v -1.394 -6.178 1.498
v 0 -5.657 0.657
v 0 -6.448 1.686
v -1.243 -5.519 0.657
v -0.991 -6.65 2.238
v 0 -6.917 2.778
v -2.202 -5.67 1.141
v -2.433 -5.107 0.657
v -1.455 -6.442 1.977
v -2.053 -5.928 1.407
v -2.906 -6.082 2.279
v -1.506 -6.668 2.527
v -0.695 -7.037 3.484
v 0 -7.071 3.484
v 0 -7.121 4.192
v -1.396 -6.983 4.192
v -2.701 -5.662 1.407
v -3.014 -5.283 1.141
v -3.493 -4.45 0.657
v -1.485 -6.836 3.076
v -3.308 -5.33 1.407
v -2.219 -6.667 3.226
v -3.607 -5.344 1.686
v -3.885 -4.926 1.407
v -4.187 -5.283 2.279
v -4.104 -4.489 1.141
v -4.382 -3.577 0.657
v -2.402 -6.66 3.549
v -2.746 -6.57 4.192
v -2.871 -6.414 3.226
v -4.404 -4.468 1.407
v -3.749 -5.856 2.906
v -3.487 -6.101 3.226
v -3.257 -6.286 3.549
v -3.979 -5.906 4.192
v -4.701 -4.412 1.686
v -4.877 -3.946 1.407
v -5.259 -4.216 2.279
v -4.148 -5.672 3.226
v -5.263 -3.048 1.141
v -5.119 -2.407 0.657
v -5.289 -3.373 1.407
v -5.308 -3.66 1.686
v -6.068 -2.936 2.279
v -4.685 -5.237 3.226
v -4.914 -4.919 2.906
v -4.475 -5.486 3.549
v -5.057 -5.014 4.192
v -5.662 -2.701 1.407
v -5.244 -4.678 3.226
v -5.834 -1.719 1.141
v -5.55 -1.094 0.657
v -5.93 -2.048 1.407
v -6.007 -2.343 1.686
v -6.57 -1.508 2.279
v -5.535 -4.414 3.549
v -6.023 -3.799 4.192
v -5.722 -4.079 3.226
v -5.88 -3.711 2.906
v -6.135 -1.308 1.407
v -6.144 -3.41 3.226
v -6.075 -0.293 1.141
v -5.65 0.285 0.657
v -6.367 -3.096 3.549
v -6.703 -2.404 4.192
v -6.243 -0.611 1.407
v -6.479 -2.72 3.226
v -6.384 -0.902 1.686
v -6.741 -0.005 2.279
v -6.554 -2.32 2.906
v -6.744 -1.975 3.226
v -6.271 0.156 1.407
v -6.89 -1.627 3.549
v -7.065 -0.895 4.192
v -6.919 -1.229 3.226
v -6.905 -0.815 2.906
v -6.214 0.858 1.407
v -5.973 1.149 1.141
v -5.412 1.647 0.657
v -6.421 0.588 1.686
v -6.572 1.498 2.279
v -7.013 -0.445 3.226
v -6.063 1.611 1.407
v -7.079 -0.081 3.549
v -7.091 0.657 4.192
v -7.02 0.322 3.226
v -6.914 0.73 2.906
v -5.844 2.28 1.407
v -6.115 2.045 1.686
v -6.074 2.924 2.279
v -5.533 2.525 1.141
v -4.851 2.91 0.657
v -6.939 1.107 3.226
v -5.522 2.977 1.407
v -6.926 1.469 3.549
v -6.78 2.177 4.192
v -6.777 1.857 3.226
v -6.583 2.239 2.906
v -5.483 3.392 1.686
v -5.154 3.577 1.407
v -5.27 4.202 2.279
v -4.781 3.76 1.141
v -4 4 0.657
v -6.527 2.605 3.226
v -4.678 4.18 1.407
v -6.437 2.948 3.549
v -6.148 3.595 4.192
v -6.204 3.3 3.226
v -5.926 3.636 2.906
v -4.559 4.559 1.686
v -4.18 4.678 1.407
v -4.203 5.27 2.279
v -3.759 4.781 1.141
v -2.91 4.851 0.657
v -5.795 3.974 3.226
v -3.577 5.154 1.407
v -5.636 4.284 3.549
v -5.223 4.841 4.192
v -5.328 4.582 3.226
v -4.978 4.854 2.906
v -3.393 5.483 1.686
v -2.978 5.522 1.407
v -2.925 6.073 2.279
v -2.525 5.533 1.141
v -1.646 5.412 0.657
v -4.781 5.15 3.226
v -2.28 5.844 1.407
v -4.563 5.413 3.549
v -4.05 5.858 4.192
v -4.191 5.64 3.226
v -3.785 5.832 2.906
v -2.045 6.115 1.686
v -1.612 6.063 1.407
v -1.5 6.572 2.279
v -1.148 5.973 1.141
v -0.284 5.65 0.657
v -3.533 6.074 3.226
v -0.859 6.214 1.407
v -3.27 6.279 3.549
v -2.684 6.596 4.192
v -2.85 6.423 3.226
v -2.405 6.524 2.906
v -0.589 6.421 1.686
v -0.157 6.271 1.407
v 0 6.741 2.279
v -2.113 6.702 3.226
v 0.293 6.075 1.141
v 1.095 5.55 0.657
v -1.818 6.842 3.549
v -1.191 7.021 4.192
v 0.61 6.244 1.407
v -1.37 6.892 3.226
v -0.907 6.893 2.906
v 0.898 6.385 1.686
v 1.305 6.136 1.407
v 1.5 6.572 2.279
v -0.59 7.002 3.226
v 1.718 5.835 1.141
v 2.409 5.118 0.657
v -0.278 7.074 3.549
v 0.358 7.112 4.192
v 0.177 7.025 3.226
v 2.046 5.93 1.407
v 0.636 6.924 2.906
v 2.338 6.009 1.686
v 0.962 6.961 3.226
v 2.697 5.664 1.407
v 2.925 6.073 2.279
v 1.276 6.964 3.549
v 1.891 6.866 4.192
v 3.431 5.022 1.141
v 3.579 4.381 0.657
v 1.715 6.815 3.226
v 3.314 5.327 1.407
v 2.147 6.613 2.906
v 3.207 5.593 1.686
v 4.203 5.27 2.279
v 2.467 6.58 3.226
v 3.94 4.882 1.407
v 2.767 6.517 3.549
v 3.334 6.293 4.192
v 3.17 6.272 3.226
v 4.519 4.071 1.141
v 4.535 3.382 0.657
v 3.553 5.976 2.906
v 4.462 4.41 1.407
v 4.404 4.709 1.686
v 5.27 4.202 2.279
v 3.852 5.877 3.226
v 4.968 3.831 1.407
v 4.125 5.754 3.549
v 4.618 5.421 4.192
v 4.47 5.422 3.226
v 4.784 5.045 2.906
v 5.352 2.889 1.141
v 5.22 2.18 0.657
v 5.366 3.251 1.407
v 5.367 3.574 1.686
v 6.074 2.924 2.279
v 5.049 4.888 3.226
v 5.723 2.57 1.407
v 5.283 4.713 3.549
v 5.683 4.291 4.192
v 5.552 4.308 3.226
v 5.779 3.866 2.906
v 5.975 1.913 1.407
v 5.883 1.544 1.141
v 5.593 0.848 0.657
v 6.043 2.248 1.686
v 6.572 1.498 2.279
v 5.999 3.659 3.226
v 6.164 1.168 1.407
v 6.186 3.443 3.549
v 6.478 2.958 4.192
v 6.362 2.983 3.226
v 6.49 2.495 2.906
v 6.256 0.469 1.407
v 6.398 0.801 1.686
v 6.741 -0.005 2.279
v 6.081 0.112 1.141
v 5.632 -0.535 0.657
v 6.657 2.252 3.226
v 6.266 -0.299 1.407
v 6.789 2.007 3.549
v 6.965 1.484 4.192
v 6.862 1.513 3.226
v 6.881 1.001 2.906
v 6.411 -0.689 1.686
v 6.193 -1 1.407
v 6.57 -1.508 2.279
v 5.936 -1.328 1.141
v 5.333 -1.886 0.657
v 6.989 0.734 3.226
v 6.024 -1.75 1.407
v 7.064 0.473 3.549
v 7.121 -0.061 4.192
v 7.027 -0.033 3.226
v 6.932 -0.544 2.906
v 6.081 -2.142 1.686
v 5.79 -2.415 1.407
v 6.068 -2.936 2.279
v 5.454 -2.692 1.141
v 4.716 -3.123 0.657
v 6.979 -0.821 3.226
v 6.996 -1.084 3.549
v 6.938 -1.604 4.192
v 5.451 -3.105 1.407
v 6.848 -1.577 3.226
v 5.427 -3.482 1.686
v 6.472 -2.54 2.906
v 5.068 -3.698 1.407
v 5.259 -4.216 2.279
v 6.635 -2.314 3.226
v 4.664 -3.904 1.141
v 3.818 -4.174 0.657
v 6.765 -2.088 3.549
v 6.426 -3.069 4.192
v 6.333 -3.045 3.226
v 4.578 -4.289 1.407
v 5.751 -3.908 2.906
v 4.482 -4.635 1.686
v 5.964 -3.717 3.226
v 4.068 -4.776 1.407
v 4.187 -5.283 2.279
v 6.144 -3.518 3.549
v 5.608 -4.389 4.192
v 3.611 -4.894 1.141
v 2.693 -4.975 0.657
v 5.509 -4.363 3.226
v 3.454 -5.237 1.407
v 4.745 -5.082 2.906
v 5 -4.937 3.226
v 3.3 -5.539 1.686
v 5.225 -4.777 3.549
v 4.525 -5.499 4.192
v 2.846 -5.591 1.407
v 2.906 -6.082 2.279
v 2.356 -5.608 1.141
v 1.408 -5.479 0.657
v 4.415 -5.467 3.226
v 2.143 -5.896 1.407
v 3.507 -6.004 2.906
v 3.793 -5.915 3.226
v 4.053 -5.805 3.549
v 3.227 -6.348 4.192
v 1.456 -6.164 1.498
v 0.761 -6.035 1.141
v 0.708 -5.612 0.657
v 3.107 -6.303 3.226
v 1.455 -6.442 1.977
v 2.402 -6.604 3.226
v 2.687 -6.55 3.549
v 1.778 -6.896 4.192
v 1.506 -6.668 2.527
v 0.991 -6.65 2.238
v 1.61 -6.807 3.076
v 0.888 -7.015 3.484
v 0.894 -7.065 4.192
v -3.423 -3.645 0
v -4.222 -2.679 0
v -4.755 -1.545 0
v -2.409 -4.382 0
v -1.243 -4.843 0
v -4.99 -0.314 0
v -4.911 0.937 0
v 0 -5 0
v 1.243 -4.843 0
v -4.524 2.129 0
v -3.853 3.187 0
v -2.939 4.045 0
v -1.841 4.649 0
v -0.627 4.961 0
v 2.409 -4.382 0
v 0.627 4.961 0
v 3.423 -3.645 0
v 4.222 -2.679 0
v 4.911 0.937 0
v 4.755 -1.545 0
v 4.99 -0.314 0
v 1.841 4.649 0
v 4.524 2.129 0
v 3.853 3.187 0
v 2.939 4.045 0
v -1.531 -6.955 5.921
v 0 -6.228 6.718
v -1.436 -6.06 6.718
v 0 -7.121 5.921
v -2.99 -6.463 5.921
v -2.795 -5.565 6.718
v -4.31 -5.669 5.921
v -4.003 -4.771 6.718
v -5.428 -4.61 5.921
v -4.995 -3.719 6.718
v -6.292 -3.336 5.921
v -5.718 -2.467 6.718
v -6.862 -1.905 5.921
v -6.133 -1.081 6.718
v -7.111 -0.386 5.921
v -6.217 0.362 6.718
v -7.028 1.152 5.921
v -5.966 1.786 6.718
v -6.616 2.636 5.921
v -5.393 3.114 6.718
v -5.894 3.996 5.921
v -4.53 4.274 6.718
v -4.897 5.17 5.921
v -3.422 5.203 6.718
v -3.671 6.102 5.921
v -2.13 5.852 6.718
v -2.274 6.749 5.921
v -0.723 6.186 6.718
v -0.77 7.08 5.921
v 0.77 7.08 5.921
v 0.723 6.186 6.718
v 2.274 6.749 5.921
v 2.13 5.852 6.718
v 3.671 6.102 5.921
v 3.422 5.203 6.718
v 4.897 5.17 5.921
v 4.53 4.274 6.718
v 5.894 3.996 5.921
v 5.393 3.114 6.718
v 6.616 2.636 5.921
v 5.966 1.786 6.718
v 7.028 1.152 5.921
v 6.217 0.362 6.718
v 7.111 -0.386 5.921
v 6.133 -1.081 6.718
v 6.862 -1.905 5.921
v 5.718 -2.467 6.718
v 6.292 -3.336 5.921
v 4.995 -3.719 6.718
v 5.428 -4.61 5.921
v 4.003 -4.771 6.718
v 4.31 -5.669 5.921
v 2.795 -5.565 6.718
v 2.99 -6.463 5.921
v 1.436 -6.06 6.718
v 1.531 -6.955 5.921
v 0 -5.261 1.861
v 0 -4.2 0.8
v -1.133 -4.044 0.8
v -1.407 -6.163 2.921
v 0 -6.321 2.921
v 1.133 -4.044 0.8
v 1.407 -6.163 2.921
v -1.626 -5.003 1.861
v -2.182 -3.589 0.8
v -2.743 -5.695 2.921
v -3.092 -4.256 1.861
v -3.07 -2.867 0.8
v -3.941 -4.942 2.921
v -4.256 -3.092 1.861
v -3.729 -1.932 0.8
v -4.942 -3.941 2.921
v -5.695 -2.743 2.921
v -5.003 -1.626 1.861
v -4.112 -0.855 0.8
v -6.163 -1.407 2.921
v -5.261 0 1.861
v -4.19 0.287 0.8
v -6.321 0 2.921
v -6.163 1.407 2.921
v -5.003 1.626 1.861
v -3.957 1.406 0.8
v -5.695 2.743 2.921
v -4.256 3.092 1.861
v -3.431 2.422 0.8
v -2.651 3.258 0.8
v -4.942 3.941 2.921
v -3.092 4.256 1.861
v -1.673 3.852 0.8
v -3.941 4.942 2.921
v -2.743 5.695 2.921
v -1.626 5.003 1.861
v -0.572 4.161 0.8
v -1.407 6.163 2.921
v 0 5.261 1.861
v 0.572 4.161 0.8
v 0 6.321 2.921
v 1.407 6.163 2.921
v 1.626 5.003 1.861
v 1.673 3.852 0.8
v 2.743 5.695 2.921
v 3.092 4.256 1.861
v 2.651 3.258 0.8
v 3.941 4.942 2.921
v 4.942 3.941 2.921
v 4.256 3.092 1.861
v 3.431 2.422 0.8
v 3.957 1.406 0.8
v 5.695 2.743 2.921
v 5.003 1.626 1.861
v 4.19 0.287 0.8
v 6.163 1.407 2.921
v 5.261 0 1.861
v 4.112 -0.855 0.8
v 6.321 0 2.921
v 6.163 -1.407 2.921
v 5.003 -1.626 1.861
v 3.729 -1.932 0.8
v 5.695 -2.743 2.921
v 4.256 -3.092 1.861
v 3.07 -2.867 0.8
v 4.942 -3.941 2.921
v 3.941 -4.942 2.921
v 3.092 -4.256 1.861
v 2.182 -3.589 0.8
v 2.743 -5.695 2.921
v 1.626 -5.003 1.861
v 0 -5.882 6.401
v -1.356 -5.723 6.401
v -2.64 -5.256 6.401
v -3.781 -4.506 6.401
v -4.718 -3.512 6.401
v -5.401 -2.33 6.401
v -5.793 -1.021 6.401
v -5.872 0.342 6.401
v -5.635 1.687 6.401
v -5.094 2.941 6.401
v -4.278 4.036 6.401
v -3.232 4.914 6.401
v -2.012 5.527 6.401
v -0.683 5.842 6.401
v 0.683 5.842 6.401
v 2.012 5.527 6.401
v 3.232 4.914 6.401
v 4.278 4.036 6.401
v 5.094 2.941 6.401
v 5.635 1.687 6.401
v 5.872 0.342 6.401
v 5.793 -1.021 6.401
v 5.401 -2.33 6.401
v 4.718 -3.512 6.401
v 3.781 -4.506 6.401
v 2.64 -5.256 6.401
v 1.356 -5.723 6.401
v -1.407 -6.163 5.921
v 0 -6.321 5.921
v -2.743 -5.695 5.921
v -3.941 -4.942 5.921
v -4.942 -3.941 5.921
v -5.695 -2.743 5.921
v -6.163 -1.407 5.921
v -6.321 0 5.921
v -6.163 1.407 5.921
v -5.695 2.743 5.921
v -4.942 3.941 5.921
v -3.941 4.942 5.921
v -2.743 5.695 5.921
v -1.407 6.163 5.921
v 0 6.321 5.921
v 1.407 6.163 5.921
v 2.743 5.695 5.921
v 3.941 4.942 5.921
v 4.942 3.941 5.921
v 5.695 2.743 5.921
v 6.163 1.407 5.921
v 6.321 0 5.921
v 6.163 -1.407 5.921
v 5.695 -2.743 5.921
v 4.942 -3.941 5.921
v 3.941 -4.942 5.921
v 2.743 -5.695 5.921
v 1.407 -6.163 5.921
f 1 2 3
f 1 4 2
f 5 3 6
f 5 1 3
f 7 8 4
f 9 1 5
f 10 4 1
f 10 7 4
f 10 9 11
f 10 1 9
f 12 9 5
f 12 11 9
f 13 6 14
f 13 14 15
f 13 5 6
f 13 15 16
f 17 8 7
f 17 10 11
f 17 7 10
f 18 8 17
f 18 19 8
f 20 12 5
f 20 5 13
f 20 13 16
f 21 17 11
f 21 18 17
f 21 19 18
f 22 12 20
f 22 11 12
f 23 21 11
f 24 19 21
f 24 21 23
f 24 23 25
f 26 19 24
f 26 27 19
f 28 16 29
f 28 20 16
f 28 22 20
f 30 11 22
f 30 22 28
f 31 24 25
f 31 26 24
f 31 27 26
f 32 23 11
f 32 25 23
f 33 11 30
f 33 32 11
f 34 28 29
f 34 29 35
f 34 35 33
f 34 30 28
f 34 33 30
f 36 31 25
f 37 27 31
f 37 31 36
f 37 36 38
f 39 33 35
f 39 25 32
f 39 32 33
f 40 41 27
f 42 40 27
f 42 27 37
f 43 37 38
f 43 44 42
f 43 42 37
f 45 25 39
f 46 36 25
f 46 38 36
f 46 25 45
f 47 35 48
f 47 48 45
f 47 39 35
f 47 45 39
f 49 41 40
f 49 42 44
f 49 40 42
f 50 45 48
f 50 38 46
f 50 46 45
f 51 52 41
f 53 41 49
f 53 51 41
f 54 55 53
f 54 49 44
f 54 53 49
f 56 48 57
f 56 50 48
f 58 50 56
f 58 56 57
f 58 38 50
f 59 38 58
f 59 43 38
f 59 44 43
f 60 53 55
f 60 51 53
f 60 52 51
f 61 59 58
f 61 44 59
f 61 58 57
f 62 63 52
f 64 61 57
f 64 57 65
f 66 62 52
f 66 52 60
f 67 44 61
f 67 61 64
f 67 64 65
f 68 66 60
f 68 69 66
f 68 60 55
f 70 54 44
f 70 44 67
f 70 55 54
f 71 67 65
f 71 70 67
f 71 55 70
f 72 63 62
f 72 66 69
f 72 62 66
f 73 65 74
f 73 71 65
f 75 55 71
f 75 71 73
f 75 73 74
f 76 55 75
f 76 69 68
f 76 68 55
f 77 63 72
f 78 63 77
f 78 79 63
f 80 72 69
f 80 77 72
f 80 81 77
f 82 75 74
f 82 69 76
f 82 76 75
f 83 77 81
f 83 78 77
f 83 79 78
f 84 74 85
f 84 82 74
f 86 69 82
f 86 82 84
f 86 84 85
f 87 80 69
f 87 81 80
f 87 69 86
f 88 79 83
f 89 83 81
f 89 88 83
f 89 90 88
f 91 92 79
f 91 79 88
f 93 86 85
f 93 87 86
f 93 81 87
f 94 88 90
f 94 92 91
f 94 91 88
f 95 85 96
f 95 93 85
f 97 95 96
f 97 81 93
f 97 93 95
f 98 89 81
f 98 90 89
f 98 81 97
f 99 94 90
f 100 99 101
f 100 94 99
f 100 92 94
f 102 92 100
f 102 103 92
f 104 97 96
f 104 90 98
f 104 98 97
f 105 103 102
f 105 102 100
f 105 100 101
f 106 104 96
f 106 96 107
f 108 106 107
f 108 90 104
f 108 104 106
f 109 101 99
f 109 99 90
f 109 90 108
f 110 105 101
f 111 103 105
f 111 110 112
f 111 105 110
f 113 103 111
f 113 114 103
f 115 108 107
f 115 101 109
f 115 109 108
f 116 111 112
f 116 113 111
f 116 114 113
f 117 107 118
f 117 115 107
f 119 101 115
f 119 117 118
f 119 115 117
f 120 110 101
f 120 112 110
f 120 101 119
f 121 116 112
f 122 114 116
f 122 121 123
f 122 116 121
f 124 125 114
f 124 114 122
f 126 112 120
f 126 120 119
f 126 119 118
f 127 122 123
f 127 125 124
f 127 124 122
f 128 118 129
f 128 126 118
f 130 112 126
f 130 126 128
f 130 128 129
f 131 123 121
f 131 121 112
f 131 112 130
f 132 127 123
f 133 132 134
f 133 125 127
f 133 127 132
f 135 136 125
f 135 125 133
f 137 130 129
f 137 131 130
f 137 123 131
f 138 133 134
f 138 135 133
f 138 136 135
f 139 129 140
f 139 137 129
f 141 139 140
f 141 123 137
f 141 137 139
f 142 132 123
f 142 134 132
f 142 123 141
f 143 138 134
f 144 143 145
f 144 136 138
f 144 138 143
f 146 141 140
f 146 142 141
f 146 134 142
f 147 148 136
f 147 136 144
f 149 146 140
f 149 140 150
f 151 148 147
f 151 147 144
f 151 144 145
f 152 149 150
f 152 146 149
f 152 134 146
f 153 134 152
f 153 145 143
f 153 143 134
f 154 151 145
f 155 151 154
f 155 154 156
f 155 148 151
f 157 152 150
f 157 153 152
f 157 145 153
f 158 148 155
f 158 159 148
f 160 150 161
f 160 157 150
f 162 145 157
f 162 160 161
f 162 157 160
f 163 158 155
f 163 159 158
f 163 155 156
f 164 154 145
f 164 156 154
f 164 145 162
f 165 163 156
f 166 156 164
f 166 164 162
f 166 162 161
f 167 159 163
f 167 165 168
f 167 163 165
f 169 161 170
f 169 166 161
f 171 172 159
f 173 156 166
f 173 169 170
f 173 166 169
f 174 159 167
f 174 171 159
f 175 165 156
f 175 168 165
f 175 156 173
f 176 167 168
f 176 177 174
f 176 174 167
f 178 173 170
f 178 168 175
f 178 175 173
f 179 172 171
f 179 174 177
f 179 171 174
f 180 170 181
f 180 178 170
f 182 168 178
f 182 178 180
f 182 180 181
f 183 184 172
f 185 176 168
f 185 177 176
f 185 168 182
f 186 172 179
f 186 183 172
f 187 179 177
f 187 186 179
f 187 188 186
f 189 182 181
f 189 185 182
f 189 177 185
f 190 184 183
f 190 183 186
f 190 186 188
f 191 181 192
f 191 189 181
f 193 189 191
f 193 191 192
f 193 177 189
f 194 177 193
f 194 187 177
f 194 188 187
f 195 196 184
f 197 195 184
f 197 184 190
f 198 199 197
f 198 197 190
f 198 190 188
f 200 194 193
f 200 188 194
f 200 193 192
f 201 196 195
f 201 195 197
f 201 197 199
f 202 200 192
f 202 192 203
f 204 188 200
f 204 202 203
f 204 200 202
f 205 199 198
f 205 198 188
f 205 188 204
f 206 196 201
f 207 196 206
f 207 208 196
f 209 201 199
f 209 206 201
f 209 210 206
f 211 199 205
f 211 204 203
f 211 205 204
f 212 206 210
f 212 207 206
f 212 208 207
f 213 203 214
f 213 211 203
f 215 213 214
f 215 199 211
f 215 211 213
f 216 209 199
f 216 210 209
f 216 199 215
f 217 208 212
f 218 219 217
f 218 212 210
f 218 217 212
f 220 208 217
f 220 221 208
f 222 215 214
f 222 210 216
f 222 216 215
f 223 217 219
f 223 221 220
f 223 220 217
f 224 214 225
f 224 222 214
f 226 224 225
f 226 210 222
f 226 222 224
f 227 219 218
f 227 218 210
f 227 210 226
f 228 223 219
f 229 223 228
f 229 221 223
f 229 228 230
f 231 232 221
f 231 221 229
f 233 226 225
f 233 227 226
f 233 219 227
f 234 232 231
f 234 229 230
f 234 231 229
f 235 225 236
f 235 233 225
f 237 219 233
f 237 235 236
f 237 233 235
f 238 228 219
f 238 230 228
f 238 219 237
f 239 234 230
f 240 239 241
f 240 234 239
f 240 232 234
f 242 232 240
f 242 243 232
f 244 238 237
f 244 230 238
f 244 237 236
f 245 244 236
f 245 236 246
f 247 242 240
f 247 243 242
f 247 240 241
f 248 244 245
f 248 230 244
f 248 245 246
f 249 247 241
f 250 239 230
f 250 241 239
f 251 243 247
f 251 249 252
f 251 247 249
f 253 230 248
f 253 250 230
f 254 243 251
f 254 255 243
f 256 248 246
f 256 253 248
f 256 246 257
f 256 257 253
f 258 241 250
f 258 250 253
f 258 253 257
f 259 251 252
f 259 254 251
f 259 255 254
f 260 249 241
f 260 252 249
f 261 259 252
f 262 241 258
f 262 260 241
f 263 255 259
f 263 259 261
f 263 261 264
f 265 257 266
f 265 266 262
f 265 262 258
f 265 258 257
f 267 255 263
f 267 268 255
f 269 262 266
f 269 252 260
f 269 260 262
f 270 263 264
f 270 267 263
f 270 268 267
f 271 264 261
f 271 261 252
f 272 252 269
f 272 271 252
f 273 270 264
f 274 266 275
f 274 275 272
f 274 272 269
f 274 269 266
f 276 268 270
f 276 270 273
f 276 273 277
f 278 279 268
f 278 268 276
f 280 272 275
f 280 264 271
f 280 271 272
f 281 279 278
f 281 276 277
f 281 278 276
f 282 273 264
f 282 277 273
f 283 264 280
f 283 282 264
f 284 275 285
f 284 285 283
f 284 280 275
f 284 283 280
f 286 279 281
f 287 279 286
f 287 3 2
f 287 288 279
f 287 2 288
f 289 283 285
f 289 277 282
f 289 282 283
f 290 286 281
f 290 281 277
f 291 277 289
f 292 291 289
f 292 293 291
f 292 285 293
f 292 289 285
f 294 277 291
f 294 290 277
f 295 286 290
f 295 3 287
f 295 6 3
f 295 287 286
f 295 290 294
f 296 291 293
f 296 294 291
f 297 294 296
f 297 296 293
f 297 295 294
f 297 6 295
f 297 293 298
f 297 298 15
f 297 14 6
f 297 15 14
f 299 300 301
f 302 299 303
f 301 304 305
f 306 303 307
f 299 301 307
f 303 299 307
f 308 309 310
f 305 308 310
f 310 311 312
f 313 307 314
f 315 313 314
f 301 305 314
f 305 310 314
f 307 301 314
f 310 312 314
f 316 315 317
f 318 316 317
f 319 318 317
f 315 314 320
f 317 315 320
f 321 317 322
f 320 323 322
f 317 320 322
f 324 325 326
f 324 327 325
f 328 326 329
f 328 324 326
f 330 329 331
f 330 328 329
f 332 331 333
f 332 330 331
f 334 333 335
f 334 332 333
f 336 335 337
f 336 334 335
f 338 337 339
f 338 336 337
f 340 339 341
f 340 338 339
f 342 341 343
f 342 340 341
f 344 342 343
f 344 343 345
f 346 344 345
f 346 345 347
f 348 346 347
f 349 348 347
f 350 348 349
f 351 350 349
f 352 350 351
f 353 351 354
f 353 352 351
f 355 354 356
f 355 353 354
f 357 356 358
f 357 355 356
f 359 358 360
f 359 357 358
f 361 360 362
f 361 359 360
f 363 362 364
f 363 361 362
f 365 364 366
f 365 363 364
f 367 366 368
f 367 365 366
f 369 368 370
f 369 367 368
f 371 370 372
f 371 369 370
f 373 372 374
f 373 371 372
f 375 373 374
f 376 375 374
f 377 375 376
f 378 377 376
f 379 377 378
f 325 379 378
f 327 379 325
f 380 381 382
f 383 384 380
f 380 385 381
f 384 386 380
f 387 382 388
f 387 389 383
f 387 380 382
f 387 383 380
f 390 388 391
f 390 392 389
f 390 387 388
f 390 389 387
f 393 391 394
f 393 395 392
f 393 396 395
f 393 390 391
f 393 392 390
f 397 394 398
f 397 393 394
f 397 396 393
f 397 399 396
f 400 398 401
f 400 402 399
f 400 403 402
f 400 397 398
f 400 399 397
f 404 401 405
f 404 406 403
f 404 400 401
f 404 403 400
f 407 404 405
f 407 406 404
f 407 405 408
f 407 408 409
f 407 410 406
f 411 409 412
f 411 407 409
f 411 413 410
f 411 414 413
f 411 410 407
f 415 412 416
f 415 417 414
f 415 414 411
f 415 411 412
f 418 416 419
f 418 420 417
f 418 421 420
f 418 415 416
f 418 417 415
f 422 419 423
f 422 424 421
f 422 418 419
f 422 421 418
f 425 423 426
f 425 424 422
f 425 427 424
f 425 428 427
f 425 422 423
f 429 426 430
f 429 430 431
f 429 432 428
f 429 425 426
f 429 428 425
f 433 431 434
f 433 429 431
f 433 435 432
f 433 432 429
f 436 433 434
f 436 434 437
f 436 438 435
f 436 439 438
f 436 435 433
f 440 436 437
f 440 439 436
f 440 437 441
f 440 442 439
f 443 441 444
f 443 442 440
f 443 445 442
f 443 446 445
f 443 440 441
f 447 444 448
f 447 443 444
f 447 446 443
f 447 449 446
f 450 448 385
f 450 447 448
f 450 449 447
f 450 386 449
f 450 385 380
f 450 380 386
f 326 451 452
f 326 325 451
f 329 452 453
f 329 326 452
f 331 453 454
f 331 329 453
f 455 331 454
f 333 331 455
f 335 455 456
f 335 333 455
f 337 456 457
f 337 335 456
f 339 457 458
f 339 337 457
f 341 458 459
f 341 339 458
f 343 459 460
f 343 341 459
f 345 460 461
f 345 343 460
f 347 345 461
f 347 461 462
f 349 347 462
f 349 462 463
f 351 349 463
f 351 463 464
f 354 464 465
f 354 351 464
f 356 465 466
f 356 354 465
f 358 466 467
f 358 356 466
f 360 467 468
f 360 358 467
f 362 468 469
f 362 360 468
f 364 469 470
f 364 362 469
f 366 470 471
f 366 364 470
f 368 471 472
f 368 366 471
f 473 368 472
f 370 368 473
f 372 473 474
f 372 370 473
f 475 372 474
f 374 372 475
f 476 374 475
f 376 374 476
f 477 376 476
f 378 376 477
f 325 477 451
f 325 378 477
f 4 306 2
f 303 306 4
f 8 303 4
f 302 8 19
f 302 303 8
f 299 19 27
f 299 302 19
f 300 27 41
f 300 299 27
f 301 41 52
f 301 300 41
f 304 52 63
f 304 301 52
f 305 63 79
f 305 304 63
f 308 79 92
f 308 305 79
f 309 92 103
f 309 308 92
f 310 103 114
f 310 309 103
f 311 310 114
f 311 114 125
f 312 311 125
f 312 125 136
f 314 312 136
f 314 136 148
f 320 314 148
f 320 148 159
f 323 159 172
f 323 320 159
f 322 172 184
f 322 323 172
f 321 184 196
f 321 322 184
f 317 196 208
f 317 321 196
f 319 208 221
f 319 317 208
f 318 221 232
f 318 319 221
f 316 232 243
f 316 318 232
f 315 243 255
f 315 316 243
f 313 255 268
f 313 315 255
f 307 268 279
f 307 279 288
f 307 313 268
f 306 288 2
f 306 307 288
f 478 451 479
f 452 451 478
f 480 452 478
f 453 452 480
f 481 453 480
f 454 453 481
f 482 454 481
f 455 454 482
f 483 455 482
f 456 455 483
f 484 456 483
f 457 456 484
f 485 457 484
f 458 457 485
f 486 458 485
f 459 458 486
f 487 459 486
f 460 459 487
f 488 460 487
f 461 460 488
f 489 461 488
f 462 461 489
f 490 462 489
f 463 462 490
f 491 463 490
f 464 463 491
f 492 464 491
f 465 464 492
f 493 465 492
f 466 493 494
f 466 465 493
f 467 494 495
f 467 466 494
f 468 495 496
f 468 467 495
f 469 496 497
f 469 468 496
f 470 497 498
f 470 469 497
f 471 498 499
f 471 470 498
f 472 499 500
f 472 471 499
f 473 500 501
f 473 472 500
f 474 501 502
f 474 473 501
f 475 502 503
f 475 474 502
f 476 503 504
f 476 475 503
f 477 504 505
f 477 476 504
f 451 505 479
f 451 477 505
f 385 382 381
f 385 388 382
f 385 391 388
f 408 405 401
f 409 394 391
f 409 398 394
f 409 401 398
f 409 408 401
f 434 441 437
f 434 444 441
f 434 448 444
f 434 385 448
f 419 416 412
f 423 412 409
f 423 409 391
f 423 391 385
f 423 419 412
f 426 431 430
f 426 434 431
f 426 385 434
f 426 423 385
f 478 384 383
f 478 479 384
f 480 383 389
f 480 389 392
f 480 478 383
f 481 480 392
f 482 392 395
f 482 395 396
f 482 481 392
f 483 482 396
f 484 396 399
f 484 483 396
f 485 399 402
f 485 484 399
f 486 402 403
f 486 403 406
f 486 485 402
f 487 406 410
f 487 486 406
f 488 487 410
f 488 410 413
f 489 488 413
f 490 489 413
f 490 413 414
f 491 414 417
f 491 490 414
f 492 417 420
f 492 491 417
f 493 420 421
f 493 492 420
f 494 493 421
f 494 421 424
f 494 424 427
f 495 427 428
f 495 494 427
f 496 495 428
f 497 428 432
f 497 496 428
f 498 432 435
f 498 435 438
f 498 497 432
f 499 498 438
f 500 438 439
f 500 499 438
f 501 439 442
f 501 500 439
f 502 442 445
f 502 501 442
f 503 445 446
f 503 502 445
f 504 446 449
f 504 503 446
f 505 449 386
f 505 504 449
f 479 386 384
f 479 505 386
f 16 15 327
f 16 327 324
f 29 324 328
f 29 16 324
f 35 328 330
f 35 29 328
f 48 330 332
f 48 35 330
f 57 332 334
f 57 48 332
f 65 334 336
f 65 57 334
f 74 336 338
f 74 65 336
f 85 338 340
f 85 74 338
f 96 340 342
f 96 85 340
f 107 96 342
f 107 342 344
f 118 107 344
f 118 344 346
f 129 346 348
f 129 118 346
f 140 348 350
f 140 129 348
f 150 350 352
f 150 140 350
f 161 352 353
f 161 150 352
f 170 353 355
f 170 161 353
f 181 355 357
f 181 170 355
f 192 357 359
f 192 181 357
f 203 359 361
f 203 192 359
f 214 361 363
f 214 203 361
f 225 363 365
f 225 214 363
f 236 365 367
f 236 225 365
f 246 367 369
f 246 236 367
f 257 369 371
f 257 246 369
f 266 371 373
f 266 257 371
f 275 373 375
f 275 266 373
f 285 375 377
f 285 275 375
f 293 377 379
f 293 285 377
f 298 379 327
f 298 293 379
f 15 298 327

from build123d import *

# Parameters (mm, degrees)
F0_R     = 5
F1_DEPTH = 0.8
F1_TAPER = 45
F4_R     = 5


with BuildPart() as f1:
    # F0 (on Top) → F1 (new body)
    with BuildSketch(Plane.XY):
        Circle(F0_R)
    extrude(amount=F1_DEPTH, taper=F1_TAPER)

    # F2 (on Right) → F3 (revolve)
    with BuildSketch(Plane.YZ):
        Polygon((-7.1213203436, 2.1213203436), (-5, 0), (-4.2, 0.8), (-6.3213203436, 2.9213203436), (-6.3213203436, 5.9213203436), (-5.8819954284, 6.4012245275), (-6.227712161, 6.7177084827), (-7.1213203436, 5.9213203436), align=None)
    revolve(axis=Axis((0, 0, 0.8), (0, 0, -1)))

    # F4
    f4_edges = [f1.edges().sort_by_distance(p)[0] for p in [
        (0, 7.12132, 2.12132),
    ]]
    fillet(f4_edges, radius=F4_R)


solid = f1.part
